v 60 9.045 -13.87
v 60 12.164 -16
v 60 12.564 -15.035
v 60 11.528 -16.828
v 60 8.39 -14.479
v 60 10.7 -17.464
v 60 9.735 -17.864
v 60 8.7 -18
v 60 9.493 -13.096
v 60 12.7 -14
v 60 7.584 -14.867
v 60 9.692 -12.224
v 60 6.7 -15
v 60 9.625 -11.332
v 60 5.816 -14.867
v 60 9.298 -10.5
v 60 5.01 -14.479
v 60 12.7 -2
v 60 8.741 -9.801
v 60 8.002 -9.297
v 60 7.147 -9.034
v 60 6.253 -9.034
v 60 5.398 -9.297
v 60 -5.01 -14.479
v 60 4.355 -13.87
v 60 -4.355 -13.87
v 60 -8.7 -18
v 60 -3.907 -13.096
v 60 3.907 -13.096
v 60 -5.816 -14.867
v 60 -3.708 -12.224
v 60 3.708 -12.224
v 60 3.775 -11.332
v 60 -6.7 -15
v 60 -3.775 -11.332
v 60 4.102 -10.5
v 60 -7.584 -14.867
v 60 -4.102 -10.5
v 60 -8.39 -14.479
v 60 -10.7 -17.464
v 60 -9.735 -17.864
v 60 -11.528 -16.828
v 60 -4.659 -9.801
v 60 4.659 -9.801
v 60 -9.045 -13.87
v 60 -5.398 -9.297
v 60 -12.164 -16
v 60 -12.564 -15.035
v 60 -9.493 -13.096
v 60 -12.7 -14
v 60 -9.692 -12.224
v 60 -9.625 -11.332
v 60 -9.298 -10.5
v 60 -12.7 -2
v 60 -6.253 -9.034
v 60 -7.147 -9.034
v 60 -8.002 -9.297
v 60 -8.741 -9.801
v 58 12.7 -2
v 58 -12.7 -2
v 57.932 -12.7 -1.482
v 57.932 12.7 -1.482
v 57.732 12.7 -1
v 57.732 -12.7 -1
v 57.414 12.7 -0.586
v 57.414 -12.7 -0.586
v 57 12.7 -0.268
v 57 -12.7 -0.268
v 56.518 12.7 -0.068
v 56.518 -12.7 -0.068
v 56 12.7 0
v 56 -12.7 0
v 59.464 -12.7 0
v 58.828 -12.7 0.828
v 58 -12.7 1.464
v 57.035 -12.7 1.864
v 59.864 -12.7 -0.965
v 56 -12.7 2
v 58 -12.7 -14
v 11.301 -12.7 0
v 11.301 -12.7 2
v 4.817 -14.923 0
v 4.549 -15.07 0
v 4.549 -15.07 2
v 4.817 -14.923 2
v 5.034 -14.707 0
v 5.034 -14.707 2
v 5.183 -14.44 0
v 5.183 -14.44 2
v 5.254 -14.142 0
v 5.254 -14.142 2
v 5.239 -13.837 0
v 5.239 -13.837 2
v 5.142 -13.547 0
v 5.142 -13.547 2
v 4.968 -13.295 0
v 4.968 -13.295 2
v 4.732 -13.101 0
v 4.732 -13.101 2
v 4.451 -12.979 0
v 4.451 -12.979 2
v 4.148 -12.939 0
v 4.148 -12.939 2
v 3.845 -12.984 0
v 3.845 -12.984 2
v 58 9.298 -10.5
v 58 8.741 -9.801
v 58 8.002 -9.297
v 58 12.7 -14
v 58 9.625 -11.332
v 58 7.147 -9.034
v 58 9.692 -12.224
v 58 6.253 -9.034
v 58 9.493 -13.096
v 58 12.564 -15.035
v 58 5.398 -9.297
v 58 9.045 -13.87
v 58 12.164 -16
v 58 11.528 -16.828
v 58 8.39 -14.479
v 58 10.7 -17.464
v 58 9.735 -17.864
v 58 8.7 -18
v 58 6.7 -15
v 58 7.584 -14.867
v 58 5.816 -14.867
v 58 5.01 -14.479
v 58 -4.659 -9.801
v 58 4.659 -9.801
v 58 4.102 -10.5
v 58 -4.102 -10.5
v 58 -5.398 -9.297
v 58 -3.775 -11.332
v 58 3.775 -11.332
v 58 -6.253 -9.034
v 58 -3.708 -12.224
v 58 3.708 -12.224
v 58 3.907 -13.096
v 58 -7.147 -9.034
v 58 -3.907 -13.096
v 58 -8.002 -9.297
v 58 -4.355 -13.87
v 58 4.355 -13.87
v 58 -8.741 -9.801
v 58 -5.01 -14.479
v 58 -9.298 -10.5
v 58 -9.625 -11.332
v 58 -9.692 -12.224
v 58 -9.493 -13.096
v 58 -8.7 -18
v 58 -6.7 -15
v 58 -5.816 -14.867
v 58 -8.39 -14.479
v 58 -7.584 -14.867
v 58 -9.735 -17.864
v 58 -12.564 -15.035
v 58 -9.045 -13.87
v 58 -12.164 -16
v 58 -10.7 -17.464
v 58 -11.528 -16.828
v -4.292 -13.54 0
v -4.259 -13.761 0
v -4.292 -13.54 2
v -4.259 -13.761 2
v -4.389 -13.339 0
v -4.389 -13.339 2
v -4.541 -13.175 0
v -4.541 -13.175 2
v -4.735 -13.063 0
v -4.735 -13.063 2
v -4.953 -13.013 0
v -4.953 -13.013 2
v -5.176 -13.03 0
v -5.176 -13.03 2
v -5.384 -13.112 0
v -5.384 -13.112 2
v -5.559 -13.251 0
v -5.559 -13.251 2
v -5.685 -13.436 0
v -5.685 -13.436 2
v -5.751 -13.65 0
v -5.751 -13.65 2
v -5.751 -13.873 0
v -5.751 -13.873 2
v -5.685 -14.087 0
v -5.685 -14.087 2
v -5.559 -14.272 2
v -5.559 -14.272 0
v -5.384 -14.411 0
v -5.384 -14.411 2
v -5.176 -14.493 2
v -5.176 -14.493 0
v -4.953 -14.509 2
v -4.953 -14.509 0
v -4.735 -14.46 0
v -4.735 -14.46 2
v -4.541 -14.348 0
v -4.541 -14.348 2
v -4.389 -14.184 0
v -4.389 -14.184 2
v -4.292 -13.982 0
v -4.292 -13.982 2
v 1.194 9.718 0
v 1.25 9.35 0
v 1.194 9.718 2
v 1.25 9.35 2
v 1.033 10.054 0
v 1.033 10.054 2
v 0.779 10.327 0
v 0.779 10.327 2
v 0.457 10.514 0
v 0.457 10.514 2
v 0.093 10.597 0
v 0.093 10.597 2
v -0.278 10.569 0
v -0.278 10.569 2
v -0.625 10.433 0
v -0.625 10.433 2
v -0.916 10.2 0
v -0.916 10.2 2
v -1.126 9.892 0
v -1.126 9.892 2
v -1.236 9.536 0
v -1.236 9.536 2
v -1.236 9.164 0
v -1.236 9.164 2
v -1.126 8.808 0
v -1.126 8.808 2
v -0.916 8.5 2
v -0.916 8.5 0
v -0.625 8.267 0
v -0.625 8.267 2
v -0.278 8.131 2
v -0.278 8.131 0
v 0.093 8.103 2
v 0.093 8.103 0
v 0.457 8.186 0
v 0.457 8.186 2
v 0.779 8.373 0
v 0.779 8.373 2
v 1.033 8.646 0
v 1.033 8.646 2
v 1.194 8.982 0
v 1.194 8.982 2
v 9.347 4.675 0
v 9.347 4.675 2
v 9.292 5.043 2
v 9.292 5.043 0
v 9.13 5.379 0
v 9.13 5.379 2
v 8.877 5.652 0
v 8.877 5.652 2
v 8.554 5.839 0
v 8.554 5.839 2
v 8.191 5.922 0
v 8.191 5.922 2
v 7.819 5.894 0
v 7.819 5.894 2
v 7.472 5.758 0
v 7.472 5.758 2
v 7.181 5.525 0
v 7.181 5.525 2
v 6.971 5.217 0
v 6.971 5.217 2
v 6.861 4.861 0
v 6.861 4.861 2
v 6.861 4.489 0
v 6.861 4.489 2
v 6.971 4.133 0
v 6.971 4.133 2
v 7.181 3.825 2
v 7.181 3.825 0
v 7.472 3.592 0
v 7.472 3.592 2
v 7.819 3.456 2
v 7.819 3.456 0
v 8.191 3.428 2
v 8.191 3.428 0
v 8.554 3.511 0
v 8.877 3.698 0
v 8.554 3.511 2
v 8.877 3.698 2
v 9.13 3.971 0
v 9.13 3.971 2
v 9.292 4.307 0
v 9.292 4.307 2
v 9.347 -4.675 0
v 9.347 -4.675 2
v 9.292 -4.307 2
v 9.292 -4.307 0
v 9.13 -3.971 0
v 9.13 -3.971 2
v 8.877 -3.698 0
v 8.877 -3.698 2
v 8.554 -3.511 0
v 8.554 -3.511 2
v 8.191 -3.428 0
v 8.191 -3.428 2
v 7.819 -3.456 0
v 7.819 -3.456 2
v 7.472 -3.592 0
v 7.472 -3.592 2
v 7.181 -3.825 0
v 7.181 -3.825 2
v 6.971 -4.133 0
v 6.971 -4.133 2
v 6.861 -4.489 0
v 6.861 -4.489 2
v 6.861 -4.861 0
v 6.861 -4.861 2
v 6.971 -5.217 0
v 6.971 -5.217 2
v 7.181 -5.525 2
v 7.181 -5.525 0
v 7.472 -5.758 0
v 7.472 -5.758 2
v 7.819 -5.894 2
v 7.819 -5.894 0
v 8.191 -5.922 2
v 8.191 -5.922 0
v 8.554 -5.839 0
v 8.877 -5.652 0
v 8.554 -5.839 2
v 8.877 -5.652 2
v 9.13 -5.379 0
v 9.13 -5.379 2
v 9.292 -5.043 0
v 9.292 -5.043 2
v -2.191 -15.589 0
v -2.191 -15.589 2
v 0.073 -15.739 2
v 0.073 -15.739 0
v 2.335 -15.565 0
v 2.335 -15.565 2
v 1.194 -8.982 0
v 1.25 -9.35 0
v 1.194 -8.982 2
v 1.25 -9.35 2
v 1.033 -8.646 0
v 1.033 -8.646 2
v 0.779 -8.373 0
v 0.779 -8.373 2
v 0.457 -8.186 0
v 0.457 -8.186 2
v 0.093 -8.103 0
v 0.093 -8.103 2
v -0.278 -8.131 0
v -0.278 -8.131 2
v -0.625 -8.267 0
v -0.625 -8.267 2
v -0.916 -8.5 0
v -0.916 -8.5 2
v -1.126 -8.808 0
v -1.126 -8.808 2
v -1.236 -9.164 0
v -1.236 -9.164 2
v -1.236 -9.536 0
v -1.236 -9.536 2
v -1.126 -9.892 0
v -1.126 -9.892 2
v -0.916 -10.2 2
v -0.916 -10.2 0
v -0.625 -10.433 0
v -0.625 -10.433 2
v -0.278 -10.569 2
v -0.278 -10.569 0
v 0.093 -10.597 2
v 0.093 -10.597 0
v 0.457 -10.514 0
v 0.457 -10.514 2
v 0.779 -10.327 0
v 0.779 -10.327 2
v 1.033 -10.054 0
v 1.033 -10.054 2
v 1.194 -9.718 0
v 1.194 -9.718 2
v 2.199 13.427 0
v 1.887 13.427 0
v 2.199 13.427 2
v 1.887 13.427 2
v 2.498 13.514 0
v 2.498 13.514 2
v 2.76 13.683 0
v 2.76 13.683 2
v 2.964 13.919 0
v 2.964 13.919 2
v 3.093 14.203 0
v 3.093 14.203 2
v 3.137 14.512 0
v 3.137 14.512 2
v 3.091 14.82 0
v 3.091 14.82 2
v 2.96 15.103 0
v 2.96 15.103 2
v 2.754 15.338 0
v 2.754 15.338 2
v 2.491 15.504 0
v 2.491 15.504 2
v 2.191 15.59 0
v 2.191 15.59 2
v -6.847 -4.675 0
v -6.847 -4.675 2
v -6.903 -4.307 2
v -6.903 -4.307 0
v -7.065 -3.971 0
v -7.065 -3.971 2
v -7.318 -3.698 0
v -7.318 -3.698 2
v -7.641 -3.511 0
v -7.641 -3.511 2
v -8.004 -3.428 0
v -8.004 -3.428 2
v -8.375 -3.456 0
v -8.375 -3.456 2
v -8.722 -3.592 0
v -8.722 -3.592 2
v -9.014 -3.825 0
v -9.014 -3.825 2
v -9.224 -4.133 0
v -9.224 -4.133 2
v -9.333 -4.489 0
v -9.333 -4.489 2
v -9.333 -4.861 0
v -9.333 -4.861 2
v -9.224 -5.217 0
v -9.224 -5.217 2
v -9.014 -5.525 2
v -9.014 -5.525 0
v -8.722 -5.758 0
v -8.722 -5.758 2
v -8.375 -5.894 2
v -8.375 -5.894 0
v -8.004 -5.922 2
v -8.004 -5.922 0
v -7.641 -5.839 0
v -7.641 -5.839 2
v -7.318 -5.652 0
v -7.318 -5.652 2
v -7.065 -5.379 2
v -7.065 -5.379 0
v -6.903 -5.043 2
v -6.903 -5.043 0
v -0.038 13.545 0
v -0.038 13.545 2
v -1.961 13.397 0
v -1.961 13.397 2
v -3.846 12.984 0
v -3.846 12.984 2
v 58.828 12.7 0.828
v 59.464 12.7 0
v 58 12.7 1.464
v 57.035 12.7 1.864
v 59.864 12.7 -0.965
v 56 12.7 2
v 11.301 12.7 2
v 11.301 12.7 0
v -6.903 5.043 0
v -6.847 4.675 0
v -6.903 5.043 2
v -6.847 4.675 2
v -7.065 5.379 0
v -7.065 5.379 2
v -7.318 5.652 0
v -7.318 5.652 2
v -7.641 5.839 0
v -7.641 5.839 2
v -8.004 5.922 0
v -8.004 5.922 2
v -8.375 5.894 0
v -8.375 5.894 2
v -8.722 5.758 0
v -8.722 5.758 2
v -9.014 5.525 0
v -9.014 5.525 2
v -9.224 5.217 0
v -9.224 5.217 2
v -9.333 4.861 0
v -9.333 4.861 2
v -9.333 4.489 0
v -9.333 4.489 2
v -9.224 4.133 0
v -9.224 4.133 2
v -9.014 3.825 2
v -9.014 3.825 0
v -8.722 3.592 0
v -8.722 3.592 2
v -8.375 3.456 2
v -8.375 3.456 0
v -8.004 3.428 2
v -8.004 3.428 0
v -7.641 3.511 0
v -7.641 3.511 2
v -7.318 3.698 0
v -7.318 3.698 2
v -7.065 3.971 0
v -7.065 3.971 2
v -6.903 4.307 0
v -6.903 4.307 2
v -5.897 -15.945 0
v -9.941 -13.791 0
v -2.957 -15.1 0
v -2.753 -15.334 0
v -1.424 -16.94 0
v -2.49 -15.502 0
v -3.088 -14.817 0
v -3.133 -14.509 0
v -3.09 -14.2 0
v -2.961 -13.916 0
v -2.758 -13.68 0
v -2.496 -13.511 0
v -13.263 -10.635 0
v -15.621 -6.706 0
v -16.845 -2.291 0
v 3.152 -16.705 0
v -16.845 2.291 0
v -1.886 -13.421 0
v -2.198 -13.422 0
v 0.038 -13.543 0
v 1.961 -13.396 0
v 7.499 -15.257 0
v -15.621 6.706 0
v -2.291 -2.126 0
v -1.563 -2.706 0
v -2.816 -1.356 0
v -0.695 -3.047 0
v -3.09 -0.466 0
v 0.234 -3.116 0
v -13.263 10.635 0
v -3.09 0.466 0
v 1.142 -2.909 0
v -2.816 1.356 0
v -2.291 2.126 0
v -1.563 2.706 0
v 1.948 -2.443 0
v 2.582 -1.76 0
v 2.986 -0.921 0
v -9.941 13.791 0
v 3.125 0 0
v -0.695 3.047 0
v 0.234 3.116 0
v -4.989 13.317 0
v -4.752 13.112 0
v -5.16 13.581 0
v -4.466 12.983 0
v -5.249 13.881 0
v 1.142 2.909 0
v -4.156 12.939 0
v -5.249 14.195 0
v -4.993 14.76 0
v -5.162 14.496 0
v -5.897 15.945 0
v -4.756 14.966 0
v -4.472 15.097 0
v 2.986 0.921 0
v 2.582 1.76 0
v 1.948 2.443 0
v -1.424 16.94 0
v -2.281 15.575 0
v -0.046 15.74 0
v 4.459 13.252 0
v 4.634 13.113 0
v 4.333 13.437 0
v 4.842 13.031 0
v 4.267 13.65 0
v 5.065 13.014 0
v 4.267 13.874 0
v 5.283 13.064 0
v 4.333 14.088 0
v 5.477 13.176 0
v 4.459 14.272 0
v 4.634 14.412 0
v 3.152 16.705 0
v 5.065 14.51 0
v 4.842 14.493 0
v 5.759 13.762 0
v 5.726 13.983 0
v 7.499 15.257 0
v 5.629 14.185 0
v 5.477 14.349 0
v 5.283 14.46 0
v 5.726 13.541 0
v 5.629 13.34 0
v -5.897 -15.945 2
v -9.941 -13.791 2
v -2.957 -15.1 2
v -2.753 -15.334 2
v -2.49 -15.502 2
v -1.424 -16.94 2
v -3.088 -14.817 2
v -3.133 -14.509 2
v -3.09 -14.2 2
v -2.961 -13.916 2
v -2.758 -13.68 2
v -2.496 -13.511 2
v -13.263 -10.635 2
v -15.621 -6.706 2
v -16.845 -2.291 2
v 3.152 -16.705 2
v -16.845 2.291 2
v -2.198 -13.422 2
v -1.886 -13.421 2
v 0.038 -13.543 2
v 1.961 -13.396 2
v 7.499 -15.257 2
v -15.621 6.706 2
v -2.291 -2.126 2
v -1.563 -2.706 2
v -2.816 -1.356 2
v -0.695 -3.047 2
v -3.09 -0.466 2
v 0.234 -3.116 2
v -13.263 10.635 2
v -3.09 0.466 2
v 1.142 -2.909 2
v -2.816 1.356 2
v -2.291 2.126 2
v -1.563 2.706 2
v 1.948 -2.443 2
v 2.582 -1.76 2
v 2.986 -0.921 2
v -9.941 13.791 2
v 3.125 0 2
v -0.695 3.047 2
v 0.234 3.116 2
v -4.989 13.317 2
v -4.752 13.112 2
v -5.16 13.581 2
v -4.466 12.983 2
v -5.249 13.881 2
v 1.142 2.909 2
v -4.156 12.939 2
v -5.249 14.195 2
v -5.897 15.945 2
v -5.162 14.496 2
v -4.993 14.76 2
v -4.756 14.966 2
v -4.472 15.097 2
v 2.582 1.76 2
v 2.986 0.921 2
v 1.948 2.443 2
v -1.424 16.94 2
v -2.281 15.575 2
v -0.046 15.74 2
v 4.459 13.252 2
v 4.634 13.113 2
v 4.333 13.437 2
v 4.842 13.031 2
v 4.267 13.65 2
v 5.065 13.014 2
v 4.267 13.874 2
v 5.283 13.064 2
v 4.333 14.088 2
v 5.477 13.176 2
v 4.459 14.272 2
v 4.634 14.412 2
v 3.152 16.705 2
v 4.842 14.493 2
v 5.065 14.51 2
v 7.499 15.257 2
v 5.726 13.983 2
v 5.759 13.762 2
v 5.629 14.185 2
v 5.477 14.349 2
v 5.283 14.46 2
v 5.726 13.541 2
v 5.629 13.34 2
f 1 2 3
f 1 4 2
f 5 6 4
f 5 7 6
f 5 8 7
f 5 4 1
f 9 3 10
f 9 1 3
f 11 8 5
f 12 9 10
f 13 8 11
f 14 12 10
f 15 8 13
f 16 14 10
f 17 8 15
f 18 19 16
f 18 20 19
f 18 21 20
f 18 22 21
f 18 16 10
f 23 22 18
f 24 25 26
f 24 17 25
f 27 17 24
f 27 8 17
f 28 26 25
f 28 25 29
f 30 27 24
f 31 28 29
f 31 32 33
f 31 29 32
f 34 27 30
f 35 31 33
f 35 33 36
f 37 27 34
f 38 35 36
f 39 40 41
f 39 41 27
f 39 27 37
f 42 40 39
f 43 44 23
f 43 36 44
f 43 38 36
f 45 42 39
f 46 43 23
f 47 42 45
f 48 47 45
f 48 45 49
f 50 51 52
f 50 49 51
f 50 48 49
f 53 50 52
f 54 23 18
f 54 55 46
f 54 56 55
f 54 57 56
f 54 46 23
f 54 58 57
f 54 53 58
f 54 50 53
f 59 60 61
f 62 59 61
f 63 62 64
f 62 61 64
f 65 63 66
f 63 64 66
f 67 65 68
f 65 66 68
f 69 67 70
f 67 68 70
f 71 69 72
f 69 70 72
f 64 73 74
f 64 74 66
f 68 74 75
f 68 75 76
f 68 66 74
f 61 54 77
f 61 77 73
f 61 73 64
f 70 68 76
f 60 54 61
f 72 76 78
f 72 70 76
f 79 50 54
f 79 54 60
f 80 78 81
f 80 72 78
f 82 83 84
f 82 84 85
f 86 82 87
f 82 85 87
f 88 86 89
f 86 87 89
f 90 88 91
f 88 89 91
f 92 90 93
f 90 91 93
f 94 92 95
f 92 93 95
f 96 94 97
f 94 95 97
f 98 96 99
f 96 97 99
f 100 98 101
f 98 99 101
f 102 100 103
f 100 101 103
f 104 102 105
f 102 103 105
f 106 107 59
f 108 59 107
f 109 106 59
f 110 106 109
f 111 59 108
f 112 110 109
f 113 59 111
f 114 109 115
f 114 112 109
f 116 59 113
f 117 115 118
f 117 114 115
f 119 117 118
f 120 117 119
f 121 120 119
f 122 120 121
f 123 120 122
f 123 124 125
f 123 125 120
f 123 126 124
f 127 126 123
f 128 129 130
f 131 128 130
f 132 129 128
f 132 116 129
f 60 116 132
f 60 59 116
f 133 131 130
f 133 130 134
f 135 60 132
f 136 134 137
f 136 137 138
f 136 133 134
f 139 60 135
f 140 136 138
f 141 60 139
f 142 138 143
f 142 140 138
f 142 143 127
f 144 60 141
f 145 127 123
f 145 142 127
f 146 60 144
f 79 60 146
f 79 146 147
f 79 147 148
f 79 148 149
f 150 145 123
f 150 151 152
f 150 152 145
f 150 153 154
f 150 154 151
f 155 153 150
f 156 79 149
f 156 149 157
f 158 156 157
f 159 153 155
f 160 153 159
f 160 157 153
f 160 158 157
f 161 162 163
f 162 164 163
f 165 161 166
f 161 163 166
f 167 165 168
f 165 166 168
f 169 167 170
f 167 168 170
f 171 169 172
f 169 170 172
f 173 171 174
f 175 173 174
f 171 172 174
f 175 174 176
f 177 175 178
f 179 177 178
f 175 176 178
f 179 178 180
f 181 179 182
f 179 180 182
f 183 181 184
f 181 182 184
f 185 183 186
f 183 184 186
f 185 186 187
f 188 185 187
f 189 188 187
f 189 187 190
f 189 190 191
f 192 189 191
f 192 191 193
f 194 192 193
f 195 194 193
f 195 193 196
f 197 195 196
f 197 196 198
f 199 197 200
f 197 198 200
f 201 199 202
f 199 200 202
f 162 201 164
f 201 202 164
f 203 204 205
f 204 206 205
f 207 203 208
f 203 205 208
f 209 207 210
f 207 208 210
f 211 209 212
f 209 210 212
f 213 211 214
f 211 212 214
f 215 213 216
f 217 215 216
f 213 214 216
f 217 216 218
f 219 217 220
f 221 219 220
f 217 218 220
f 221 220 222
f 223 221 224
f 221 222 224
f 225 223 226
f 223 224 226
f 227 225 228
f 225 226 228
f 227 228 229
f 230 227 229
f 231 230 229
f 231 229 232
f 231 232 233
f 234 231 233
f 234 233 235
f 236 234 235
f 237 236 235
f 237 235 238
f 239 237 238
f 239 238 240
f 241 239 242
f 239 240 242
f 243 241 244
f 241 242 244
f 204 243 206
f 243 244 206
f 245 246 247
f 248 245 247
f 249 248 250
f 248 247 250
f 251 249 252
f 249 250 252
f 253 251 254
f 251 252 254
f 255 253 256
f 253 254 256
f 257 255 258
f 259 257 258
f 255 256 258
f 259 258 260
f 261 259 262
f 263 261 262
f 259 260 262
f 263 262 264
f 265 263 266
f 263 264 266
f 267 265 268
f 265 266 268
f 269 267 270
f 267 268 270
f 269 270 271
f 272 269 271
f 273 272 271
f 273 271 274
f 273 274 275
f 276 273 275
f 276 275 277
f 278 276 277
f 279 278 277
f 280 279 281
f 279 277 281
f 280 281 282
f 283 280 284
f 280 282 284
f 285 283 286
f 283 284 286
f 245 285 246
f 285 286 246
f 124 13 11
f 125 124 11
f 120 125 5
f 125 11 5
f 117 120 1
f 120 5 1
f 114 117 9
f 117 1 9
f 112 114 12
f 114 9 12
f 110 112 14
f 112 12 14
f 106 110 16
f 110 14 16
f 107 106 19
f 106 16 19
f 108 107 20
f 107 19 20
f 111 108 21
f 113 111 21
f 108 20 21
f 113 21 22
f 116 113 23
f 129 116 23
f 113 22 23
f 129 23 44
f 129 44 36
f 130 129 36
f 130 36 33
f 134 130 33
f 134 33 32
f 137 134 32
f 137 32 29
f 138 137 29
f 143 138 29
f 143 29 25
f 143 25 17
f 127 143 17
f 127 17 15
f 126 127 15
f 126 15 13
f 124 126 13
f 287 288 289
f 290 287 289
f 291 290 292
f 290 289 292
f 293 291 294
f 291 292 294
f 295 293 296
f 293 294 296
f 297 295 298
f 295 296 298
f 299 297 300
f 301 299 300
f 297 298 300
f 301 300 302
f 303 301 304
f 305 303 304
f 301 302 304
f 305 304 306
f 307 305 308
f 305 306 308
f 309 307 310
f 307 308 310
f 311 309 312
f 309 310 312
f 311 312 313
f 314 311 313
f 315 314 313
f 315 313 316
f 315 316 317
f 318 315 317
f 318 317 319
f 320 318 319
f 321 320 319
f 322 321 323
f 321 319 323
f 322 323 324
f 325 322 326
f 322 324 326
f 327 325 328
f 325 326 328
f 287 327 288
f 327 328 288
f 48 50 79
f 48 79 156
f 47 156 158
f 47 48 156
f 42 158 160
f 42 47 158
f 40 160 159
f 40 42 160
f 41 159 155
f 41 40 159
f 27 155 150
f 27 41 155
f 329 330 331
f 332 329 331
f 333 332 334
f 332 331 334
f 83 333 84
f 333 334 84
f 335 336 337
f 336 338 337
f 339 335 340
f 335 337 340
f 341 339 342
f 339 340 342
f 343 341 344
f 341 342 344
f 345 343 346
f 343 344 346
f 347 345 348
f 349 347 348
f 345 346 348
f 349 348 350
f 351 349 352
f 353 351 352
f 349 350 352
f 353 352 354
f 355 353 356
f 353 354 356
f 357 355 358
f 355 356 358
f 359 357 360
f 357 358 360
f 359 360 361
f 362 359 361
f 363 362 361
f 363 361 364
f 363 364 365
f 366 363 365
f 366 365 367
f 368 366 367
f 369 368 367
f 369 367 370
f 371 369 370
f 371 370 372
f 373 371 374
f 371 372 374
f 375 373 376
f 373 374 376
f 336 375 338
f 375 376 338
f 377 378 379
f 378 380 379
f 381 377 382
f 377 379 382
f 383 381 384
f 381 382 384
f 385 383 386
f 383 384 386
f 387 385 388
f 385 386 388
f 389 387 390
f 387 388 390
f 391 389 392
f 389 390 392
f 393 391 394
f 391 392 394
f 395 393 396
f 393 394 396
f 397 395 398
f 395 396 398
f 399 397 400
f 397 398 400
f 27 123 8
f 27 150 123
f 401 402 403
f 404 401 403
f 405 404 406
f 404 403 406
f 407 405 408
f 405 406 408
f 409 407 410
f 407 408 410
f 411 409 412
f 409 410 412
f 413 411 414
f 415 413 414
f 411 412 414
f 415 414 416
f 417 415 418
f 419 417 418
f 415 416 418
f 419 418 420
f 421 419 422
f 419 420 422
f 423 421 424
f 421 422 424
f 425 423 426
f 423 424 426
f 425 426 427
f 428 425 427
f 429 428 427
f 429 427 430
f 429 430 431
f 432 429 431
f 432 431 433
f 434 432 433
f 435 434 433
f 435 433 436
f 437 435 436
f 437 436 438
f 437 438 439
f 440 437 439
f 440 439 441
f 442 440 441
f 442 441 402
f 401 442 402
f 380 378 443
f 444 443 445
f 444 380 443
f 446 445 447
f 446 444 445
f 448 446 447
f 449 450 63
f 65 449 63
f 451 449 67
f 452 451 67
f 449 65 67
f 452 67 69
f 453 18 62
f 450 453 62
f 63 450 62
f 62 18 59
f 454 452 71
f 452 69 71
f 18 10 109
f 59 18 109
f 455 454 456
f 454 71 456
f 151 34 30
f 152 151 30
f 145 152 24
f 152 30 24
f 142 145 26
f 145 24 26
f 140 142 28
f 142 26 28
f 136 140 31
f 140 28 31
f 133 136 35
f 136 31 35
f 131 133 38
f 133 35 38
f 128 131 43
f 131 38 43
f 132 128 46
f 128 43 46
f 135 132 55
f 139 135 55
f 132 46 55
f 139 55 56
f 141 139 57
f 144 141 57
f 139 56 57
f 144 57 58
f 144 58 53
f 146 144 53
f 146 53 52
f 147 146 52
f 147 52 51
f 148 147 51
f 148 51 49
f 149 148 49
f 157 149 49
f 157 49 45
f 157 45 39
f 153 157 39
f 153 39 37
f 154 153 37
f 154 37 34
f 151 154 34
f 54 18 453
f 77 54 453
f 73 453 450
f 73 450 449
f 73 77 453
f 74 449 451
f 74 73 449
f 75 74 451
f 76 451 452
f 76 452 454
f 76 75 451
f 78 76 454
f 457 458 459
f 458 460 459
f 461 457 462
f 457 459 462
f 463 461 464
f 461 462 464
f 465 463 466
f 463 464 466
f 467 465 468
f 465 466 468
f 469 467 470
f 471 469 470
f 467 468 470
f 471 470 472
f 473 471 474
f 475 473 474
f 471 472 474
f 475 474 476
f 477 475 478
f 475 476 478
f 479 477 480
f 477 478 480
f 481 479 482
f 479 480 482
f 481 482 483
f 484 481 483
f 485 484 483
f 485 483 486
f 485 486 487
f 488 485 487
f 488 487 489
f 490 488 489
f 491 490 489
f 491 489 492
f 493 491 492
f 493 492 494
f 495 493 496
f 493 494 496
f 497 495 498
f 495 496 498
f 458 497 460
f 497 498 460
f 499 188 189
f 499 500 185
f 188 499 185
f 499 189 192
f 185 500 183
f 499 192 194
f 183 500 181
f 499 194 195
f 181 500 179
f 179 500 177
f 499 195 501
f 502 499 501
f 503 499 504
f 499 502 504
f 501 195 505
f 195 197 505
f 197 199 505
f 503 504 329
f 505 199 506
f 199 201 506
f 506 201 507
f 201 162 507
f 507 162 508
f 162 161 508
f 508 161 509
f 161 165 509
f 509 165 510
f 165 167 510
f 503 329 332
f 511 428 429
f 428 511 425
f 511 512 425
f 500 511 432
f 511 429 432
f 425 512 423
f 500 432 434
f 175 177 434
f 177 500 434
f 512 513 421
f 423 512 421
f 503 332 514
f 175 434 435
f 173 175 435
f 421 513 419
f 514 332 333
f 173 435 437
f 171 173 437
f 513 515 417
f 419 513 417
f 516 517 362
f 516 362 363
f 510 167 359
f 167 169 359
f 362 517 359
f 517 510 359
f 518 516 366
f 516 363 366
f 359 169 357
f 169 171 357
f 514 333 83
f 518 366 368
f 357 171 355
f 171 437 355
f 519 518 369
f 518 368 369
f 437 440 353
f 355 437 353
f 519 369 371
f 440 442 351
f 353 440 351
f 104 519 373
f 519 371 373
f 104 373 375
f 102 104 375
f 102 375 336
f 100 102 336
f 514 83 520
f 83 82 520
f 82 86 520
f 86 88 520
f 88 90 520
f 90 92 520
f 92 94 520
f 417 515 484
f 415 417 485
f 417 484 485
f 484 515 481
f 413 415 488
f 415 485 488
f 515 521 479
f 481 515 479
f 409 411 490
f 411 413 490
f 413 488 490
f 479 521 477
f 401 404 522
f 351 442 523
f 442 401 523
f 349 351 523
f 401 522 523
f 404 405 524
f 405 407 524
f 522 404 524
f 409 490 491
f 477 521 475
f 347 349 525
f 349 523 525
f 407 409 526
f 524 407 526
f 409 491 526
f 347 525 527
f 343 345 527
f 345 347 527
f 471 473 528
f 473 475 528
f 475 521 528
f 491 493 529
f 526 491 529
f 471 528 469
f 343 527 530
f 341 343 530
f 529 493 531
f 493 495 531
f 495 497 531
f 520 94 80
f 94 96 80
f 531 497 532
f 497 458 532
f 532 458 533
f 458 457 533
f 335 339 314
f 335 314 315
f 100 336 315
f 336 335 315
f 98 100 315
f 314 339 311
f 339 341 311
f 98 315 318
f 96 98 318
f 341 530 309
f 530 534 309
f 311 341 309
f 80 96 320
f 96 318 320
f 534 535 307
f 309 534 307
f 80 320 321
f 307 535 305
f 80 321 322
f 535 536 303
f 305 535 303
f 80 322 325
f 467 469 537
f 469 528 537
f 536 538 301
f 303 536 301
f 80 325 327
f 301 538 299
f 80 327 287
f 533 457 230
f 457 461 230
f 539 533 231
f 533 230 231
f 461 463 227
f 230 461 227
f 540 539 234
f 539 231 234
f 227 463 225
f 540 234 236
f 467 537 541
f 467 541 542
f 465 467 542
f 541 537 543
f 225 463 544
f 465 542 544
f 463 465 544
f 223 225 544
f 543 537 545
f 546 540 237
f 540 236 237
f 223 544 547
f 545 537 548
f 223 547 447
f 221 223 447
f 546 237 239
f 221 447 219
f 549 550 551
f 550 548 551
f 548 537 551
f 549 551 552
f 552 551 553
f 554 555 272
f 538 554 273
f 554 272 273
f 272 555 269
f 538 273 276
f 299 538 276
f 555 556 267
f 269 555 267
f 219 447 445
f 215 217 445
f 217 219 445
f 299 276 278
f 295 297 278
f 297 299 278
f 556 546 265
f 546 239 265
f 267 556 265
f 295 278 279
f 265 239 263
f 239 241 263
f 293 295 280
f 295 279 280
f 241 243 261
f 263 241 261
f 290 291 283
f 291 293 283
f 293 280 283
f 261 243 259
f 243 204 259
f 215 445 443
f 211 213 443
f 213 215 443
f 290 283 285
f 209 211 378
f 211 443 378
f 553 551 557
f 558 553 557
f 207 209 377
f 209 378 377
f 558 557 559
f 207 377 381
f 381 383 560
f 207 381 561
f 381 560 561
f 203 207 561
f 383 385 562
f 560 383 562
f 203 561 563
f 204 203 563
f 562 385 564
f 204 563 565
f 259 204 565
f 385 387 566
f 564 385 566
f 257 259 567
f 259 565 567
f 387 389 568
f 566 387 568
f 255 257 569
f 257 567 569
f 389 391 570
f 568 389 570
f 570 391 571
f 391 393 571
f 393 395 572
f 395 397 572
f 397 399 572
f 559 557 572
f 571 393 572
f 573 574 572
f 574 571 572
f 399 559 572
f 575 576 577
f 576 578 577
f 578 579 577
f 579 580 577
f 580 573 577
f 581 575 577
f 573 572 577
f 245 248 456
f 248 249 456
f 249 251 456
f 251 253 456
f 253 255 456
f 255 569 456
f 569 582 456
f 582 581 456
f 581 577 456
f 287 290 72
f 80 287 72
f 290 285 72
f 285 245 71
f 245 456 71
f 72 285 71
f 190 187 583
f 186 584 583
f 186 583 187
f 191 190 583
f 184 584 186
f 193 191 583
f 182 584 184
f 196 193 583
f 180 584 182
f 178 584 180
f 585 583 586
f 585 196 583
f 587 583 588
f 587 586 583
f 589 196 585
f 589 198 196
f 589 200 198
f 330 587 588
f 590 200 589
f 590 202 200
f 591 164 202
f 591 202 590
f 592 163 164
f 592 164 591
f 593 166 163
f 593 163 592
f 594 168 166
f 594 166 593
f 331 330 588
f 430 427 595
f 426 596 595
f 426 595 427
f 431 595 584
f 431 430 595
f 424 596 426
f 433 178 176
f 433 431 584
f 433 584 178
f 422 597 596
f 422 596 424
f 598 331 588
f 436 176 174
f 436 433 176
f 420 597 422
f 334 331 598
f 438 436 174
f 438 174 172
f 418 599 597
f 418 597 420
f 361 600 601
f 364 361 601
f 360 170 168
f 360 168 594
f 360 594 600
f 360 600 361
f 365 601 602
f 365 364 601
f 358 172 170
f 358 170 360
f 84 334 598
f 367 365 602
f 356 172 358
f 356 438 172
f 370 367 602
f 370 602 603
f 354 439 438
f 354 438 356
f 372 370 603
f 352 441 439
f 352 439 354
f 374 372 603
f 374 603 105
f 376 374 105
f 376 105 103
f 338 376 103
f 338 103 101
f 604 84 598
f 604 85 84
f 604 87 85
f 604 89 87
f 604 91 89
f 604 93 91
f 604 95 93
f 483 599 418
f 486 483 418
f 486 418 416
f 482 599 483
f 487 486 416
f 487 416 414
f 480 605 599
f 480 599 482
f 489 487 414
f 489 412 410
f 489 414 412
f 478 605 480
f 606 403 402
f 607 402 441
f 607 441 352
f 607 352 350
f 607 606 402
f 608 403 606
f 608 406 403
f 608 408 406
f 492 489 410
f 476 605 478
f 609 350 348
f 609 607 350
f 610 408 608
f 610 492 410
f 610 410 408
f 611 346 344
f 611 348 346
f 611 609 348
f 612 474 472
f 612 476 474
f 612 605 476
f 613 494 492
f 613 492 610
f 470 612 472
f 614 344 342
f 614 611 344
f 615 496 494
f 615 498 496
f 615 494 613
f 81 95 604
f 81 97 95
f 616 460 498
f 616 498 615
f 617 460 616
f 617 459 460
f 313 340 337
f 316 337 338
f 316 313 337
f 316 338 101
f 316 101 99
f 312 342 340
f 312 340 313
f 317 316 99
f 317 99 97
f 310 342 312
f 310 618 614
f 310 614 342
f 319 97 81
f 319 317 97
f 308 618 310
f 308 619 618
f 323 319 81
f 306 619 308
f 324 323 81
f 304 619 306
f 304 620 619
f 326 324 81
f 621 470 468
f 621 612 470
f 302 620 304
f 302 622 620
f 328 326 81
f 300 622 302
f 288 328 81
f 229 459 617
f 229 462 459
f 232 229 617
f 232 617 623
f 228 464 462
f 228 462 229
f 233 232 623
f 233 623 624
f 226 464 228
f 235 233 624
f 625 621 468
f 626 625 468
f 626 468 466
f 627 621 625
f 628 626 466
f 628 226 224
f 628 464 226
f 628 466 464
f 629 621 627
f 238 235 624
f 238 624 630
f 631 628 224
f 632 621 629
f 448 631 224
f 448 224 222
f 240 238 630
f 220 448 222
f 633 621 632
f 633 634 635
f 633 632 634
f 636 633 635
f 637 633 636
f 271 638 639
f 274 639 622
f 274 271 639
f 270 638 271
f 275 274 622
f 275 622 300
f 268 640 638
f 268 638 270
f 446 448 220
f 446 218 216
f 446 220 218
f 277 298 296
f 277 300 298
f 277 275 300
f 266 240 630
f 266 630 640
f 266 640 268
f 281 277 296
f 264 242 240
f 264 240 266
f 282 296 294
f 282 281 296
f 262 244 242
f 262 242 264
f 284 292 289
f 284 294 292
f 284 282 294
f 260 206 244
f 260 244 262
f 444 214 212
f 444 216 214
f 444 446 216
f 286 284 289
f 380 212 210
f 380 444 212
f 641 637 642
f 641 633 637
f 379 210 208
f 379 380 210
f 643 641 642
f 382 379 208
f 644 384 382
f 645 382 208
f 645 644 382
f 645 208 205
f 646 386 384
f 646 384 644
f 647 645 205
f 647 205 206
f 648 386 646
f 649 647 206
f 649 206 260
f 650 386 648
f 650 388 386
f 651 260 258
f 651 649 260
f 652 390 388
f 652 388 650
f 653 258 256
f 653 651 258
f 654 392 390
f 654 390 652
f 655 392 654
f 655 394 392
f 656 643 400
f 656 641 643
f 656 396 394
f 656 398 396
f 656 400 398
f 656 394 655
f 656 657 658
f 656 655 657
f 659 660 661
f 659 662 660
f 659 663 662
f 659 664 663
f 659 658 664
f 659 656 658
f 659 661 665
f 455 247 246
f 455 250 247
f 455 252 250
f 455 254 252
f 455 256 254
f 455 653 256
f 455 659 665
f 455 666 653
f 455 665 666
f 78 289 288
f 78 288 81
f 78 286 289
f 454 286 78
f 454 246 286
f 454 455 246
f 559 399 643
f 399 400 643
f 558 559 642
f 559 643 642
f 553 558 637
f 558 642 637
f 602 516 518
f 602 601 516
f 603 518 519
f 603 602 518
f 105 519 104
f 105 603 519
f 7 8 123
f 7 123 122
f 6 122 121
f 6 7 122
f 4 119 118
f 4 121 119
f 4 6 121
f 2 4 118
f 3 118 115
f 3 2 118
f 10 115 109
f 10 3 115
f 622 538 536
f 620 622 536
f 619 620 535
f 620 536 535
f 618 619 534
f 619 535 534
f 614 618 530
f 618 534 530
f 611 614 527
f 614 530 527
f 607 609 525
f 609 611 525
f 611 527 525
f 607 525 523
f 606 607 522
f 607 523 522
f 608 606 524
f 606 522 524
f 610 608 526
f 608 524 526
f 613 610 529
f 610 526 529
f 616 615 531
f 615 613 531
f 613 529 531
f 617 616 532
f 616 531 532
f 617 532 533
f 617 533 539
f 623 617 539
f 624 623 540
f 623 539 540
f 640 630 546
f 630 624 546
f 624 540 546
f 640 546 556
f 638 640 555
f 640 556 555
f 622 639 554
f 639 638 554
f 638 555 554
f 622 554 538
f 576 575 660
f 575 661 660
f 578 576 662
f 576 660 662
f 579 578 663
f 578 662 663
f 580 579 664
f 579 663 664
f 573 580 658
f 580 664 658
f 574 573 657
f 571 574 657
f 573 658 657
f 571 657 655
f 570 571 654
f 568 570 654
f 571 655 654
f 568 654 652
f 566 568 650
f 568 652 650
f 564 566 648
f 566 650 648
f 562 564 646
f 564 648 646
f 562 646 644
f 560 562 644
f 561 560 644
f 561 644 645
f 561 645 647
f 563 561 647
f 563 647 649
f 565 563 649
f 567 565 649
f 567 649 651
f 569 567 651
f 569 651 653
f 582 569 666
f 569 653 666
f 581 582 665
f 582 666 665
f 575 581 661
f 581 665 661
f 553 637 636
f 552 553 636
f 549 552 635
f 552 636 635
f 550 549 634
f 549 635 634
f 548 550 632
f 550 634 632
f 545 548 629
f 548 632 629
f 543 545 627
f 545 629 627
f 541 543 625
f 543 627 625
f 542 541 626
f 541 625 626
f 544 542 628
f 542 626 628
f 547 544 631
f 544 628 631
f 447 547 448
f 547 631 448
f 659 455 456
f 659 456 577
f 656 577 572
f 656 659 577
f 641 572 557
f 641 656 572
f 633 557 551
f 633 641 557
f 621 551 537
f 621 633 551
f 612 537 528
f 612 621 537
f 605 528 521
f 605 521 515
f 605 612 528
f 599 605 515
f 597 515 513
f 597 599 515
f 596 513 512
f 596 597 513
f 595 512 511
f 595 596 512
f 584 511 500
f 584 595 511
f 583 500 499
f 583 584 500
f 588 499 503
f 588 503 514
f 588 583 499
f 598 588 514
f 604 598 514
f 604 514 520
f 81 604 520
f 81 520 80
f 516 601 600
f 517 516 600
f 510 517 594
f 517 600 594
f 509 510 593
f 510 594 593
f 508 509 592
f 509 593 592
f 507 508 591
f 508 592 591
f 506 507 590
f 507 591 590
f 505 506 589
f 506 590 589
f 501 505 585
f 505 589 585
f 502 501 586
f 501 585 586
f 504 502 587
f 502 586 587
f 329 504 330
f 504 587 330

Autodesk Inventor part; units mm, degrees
ref_plane "YZ Plane" through (0, 0, 0) normal (1, 0, 0) x (0, 1, 0)
ref_plane "XZ Plane" through (0, 0, 0) normal (0, 1, 0) x (-1, 0, 0)
ref_plane "XY Plane" through (0, 0, 0) normal (0, 0, 1) x (1, 0, 0)
sketch "Base" plane through (0, 0, 0) normal (0, 0, 1) x (1, 0, 0)
  circle A0 centre (0, 0) radius 3.125
  circle A1 centre (0, 0) radius 12.7
  line L0 (0, 12.7) -> (60, 12.7)
  line L1 (60, 12.7) -> (60, -12.7)
  line L2 (60, -12.7) -> (0, -12.7)
  dimension "d0" = 6.25
  dimension "d1" = 25.4
  dimension "d2" = 60
extrude "Plate1" add sketch "Base" along normal blind 2
sketch "Sketch2" plane through (58, -12.7, 2) normal (1, 0, 0) x (0, 1, 0)
  line L0 (25.4, 0) -> (0, 0)
  line L1 (0, 0) -> (0, -20)
  line L2 (0, -20) -> (25.4, -20)
  line L3 (25.4, -20) -> (25.4, 0)
edge flange "MountFeature" height 20 angle 90 thickness 2 bend radius 2 thickness toward (1, 0, 0) relief tear relief width 2 relief depth 1 edges at (60, 0, 0) wall of the first edge with corners at (58, 12.7, 2) (58, -12.7, 2) (58, -12.7, -18) (58, 12.7, -18)
bend "Bend1"
corner "Corner1"
fillet "MountFilletsFeature" radius 4 2 edges at (59, -12.7, -18) (59, 12.7, -18)
sketch "HubMountHoles" plane through (0, 0, 2) normal (0, 0, 1) x (1, 0, 0)
  circle A0 centre (0, 9.35) radius 1.25 projected
  circle A1 centre (8.0973, 4.675) radius 1.25 projected
  circle A2 centre (8.0973, -4.675) radius 1.25 projected
  circle A3 centre (0, -9.35) radius 1.25 projected
  circle A4 centre (-8.0973, -4.675) radius 1.25 projected
  circle A5 centre (-8.0973, 4.675) radius 1.25 projected
  point P0 (0, 0)
extrude "HubMountHolesFeature" cut sketch "HubMountHoles" against normal blind 2
sketch "PotMountHoles" plane through (0, 0, 2) normal (0, 0, 1) x (1, 0, 0)
  arc A0 (2.191, 15.5897) -> (-4.4715, 15.0972) centre (0.0082, -0.192) ccw
  arc A1 (-4.4715, 15.0972) -> (-3.8455, 12.9843) centre (-4.1585, 14.0408) ccw
  arc A2 (1.887, 13.4273) -> (-3.8455, 12.9843) centre (0.0734, -0.4153) ccw
  arc A3 (1.887, 13.4273) -> (2.191, 15.5897) centre (2.0448, 14.5077) ccw
  circle A4 centre (5.0089, 13.7622) radius 0.75
  circle A5 centre (-5.0089, -13.7614) radius 0.75
  arc A6 (-1.8863, -13.4212) -> (-2.1909, -15.5889) centre (-2.0386, -14.505) ccw
  arc A7 (-1.8863, -13.4212) -> (3.8453, -12.9835) centre (-0.0533, 0.3202) ccw
  arc A8 (-2.1909, -15.5889) -> (4.5487, -15.0702) centre (-0.0101, 0.1221) ccw
  arc A9 (4.5487, -15.0702) -> (3.8453, -12.9835) centre (4.1564, -14.0405) ccw
  circle A10 centre (0, 0) radius 3.125
  circle A11 centre (0, 0) radius 17
  circle A12 centre (-8.0973, 4.675) radius 1.25
  circle A13 centre (0, 9.35) radius 1.25
  circle A14 centre (8.0973, 4.675) radius 1.25
  circle A15 centre (8.0973, -4.675) radius 1.25
  circle A16 centre (0, -9.35) radius 1.25
  circle A17 centre (-8.0973, -4.675) radius 1.25
  dimension "d17" = 34
sheet face with bend "PotMountHolesFeature" sketch "PotMountHoles" thickness 2 toward (0, 0, -1) bend radius 2
bend "Bend3"
sketch "Sketch5" plane through (60, -12.7, -2) normal (1, 0, 0) x (0, 0, -1)
  line L0 (0, 25.4) -> (12, 25.4) construction
  line L1 (12, 0) -> (0, 0) construction
  line L2 (10, 25.4) -> (10, 0) construction
  circle A0 centre (10, 19.4) radius 3
  circle A1 centre (10, 6) radius 3
  line L3 (16, 21.4) -> (16, 4) projected
  point P0 (-2, 12.7)
  dimension "d28" = 6
  dimension "d29" = 6
  dimension "d30" = 6
  dimension "d31" = 6
  dimension "d32" = 6
extrude "Cut2" cut sketch "Sketch5" against normal blind 2
equation "\"d15\" = Thickness"
equation "\"d33\" = Thickness"
equation "\"d3\" = Thickness"
equation "\"d4\" = BendReliefWidth"
equation "\"d5\" = BendReliefDepth"
equation "\"d6\" = MinimumRemnant"
equation "\"d7\" = TransitionRadius"
equation "\"d10\" = BendRadius"
equation "\"d11\" = CornerReliefSize"
equation "\"d12\" = GapSize"
equation "\"d13\" = JacobiRadiusSize"
equation "\"d23\" = BendRadius"
equation "\"d24\" = BendReliefWidth"
equation "\"d26\" = MinimumRemnant"
equation "\"d25\" = BendReliefDepth"
equation "\"d27\" = TransitionRadius"
equation "\"BendRadius\" = Thickness"
equation "\"BendReliefWidth\" = Thickness"
equation "\"BendReliefDepth\" = 0.5 * Thickness"
equation "\"CornerReliefSize\" = 4 * Thickness"
equation "\"MinimumRemnant\" = 2 * Thickness"
equation "\"TransitionRadius\" = BendRadius"
equation "\"JacobiRadiusSize\" = BendRadius"
equation "\"GapSize\" = Thickness"
equation "\"Thickness\" = 2"
properties part number "NeckPotentiometerBracket"
